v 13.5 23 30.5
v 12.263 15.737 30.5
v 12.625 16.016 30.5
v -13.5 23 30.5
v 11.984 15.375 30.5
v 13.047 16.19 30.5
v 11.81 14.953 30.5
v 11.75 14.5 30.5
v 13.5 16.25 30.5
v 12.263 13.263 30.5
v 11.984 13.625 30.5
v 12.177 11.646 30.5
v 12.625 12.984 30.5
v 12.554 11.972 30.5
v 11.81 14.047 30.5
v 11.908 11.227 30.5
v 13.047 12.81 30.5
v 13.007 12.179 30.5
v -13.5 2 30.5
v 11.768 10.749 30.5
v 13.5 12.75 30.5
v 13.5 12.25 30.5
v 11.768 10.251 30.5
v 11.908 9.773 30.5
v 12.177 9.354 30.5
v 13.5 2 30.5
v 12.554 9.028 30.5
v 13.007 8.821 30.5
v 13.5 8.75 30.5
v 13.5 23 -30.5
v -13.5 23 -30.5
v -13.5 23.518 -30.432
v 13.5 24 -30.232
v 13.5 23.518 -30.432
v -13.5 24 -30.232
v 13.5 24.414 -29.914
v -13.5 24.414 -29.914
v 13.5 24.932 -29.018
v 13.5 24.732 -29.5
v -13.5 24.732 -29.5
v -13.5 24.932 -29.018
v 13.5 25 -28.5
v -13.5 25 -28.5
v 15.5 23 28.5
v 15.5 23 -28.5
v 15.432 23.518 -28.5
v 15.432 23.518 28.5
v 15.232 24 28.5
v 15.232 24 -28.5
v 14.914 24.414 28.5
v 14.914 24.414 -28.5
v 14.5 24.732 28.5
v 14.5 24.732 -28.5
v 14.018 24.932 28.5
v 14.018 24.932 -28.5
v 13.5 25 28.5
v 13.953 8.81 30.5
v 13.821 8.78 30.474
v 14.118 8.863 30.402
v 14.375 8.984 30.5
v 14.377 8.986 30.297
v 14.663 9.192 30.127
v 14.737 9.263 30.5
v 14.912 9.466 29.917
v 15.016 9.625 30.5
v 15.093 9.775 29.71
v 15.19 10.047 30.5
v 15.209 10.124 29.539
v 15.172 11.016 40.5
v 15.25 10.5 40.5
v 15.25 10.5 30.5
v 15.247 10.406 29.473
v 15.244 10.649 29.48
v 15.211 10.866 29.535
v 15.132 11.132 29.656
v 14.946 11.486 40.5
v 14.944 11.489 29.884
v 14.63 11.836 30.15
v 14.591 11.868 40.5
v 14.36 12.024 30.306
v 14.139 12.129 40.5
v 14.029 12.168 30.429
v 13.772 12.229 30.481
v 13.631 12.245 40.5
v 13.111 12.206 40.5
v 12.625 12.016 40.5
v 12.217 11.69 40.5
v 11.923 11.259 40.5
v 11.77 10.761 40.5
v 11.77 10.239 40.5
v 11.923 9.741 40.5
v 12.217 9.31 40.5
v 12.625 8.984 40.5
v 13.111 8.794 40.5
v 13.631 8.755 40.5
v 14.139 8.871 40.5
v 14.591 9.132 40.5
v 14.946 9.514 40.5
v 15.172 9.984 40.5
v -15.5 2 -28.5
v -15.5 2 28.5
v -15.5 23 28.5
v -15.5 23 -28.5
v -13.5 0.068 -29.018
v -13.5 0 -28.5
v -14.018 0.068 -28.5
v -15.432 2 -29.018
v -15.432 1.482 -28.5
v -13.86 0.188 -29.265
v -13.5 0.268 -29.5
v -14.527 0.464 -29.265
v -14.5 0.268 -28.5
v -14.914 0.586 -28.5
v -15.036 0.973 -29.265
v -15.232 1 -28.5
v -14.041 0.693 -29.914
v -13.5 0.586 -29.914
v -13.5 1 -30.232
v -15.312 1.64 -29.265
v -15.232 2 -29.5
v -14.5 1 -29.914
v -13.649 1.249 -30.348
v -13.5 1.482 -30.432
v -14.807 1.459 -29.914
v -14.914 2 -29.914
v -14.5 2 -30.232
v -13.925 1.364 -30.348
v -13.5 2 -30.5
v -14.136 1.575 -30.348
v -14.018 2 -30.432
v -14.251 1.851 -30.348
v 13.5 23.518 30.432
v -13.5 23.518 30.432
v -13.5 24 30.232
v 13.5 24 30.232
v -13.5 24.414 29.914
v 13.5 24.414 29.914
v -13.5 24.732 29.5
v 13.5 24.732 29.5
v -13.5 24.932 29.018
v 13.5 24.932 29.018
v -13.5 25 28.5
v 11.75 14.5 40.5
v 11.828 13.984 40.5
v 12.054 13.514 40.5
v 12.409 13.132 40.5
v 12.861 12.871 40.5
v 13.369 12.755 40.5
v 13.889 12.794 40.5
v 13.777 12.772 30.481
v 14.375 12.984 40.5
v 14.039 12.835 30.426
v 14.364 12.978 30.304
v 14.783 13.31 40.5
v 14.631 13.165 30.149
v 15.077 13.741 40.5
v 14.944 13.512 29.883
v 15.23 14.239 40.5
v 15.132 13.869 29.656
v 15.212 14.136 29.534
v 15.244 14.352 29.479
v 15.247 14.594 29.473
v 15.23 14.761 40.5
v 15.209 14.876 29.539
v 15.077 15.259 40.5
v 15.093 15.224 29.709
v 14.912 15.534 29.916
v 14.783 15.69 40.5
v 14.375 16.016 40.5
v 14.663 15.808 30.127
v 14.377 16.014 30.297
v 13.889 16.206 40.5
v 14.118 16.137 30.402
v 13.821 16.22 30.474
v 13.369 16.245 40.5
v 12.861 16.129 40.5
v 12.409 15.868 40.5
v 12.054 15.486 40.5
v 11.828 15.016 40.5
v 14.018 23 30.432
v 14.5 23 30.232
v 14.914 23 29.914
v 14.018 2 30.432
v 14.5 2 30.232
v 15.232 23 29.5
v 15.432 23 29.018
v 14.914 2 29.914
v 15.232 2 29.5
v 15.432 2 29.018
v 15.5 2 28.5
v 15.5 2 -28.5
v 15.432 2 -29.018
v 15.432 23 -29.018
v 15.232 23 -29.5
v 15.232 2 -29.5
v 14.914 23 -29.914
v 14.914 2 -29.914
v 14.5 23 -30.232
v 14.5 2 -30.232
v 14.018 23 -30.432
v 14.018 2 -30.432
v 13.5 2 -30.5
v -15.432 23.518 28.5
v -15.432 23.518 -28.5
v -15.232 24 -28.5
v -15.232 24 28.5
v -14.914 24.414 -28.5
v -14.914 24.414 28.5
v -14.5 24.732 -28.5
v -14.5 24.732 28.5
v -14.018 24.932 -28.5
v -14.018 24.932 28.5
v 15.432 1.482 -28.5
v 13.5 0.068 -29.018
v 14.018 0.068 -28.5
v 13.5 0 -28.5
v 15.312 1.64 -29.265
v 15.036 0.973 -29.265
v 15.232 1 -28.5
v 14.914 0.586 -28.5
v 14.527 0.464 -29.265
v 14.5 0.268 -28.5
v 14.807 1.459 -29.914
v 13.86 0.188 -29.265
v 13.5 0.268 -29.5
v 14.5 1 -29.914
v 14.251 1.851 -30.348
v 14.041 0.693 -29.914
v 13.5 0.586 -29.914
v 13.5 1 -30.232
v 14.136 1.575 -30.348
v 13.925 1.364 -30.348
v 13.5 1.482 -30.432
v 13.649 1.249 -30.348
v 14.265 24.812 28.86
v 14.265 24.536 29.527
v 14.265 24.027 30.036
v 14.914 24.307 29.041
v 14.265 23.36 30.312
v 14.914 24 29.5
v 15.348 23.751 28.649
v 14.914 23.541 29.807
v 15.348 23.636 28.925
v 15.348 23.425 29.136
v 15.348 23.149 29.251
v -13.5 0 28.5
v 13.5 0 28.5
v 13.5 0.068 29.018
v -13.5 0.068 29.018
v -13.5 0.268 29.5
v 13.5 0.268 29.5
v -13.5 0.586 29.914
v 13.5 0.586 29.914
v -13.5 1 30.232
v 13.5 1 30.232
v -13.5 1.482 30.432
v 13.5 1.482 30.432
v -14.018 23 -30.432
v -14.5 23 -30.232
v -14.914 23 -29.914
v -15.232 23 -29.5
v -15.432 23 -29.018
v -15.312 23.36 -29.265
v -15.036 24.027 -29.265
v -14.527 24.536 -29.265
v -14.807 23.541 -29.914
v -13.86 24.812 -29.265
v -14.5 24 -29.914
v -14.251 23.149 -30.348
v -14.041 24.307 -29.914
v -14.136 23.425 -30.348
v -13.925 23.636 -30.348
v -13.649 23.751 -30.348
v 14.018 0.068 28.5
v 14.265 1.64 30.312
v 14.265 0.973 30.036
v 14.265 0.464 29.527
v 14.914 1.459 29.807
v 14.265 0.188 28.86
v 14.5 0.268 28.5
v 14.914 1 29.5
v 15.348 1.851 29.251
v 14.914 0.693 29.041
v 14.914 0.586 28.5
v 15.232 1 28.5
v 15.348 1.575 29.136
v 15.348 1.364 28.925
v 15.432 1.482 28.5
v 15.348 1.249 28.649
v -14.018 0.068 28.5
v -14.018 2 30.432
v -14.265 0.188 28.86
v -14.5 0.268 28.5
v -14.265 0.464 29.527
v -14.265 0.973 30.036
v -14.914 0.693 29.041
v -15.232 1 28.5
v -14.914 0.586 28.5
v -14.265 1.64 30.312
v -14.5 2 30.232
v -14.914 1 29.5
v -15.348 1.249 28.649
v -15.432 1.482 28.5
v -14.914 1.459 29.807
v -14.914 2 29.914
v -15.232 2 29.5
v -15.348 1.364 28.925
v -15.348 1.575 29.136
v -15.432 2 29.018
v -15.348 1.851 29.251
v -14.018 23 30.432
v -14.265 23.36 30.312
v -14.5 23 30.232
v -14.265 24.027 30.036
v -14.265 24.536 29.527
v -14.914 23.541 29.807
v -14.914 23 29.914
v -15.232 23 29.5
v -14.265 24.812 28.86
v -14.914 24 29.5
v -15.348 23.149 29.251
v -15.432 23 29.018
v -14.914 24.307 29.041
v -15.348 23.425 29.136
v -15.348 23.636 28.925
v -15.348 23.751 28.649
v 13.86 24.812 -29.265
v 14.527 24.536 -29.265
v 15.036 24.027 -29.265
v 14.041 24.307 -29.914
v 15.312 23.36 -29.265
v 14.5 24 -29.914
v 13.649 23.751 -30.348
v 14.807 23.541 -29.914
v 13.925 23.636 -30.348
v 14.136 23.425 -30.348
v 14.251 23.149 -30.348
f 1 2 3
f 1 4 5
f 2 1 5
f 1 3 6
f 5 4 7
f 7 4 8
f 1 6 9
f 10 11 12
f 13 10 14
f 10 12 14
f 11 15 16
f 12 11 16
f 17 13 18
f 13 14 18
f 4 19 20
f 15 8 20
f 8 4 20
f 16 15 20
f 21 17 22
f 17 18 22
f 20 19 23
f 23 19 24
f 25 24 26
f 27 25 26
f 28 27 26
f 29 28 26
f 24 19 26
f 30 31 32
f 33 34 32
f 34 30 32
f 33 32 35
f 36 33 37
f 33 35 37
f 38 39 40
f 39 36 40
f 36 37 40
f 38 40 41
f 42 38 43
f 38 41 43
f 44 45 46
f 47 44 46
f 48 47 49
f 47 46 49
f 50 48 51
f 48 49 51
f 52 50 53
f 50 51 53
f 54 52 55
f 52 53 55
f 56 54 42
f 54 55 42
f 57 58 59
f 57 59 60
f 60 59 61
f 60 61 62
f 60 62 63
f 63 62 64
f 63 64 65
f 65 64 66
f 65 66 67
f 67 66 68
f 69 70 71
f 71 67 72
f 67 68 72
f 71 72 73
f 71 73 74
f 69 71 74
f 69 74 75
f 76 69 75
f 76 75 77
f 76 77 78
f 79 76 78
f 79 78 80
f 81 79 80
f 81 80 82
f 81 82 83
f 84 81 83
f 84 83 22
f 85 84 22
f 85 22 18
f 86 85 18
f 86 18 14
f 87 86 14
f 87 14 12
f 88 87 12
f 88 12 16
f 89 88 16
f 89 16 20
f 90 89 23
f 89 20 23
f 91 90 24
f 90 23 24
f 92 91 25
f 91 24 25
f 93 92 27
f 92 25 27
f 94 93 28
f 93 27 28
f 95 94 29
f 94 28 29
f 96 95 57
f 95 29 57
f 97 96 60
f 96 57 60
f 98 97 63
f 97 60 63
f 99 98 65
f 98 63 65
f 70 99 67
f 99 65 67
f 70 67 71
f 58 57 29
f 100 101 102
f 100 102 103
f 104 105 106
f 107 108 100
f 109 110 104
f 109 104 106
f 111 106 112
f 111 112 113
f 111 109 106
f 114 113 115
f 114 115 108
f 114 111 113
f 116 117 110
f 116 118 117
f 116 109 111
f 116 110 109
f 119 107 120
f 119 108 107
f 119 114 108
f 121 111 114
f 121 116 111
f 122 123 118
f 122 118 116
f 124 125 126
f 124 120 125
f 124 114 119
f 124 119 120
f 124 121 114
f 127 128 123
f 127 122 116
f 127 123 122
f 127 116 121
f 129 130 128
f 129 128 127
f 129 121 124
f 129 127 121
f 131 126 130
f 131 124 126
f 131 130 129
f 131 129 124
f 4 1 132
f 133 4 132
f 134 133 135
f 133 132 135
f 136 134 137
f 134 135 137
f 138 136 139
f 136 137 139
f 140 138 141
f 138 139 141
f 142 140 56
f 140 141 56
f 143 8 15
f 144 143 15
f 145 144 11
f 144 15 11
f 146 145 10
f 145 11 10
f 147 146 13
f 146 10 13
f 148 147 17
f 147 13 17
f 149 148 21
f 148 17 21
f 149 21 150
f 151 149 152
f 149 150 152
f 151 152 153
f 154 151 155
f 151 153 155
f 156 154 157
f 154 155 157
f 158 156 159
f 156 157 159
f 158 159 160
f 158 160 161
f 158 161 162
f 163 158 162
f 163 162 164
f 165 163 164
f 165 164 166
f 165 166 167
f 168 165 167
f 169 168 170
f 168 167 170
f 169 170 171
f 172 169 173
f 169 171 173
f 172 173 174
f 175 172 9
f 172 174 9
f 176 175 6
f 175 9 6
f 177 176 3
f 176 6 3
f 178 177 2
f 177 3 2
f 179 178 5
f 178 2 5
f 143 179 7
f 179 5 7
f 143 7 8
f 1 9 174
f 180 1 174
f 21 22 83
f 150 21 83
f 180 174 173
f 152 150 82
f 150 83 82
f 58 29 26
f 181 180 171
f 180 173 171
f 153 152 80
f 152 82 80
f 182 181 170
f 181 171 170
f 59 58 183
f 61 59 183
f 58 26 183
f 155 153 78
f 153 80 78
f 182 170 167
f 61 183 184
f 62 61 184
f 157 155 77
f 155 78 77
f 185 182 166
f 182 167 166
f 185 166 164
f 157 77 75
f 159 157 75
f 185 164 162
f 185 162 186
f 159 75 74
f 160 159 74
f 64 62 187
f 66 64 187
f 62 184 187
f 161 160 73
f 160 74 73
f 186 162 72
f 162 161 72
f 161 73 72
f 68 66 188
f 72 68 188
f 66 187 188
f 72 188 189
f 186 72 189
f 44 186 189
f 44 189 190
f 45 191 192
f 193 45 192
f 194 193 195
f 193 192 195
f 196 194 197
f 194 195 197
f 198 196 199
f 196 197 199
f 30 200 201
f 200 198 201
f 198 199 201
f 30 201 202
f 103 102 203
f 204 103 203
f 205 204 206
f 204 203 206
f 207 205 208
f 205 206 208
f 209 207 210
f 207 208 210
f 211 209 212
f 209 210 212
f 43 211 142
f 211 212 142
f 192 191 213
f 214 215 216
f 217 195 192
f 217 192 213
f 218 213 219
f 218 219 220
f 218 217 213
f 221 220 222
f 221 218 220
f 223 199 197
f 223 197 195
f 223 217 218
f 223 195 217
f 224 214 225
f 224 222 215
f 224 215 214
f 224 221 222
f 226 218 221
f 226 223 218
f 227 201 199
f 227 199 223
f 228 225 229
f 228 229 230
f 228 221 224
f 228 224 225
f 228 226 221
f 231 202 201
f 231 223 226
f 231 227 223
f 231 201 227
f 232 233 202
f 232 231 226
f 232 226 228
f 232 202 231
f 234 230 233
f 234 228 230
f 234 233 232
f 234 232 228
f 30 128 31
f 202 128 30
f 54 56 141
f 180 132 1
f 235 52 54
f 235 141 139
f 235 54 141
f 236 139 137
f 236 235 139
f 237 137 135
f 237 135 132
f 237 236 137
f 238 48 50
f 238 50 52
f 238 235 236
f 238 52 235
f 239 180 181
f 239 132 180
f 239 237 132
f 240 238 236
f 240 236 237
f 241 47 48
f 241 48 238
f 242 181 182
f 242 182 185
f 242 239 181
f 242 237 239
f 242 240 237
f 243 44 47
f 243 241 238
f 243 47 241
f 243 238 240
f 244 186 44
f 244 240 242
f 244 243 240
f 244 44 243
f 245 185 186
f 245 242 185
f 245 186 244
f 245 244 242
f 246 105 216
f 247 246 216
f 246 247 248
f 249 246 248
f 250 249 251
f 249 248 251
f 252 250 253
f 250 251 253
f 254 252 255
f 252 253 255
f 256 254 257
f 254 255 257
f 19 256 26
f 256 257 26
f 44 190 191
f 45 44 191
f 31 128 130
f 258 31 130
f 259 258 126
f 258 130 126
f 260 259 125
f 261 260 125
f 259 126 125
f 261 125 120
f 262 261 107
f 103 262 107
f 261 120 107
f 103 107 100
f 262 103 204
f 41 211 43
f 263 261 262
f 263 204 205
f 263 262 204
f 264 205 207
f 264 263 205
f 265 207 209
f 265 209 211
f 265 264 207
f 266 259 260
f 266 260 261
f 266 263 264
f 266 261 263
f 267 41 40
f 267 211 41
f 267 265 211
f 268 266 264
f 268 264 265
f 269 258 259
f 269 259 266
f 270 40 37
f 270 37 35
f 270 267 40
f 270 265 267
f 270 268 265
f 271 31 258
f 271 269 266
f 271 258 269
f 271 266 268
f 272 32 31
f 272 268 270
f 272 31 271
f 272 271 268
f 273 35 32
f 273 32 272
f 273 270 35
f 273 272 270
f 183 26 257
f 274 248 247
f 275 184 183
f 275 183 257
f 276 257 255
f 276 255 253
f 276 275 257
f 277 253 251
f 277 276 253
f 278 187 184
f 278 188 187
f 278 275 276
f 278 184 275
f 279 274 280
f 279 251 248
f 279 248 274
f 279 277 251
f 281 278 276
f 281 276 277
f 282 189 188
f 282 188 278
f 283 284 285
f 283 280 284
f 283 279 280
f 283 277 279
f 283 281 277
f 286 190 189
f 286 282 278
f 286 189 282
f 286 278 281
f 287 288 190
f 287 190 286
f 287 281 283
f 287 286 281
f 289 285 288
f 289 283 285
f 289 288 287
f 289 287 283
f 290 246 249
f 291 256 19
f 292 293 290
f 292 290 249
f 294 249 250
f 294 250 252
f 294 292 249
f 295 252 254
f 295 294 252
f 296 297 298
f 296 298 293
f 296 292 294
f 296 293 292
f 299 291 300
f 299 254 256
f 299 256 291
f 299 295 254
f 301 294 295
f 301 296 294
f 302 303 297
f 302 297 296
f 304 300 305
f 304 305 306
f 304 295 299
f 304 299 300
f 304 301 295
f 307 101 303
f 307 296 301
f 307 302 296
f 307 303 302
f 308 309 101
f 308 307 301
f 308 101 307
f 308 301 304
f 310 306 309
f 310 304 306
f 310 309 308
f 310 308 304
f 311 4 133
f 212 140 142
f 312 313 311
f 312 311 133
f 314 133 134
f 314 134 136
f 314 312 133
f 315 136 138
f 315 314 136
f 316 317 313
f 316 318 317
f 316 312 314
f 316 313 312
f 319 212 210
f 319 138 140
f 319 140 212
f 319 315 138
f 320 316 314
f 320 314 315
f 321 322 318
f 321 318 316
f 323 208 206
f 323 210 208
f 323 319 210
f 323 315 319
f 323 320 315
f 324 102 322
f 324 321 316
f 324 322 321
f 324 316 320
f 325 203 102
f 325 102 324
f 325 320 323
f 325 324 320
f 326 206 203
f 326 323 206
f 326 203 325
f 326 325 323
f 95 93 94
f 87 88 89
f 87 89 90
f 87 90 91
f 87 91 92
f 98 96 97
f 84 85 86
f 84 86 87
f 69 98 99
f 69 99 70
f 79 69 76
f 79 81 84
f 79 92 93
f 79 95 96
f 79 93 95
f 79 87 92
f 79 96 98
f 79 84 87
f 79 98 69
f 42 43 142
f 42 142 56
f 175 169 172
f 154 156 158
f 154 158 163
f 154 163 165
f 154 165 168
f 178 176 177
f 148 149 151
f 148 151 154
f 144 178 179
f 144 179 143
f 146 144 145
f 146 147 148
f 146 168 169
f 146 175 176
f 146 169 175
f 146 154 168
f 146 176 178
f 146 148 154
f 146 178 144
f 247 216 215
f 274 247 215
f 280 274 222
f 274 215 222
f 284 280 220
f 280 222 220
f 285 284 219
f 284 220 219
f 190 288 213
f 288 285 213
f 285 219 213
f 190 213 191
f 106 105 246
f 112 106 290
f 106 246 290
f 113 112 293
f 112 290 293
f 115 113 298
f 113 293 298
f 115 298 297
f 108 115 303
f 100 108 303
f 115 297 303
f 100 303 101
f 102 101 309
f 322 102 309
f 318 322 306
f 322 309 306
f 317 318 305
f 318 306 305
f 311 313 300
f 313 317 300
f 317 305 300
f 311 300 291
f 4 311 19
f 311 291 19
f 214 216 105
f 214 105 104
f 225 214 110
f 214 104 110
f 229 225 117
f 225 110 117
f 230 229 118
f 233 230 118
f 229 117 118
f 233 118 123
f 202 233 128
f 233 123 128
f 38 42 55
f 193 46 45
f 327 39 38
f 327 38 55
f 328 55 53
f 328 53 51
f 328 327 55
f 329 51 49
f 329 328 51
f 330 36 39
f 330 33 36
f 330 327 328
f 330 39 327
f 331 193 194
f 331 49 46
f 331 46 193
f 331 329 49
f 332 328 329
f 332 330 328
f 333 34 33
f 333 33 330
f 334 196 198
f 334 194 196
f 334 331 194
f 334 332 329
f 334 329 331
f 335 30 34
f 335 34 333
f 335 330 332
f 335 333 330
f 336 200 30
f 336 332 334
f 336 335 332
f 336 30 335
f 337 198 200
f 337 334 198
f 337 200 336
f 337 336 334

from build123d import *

# Parameters (mm, degrees)
SKETCH1_W           = 31
SKETCH1_H           = 61
BOSS_EXTRUDE1_DEPTH = 25
SKETCH2_R           = 1.75
BOSS_EXTRUDE2_DEPTH = 10
FILLET1_R           = 2


with BuildPart() as part:
    # Sketch1 → Boss-Extrude1 (new body)
    with BuildSketch(Plane(origin=(0, 0, 0), x_dir=(1, 0, 0), z_dir=(0, 1, 0))):
        Rectangle(SKETCH1_W, SKETCH1_H)
    extrude(amount=BOSS_EXTRUDE1_DEPTH)

    # Sketch2 → Boss-Extrude2 (add)
    with BuildSketch(Plane.XY.offset(30.5)):
        with Locations(Location((13.5, 14.5, 0), (0, 0, 180))):
            Circle(SKETCH2_R)
        with Locations((13.5, 10.5)):
            Circle(SKETCH2_R)
    extrude(amount=BOSS_EXTRUDE2_DEPTH)

    # Fillet1
    # the kernel refuses this fillet: 2 mm, written as the material it takes off along each edge
    with BuildSketch(Plane(origin=(-13.5, 23, 28.5), x_dir=(0, 1, 0), z_dir=(-1, 0, 0))) as fillet1_piece_1_section:
        Polygon((0, 0), (FILLET1_R, 0), (FILLET1_R, -FILLET1_R), (0, -FILLET1_R), align=None)
    fillet1_piece_1 = extrude(amount=FILLET1_R, mode=Mode.PRIVATE)
    fillet1_piece_1 = fillet1_piece_1 - Plane(origin=(-13.5, 23, 28.5), x_dir=(0, -0.7071067811865475, -0.7071067811865475), z_dir=(-1, 0, 0)) * Sphere(FILLET1_R, mode=Mode.PRIVATE)
    add(fillet1_piece_1, mode=Mode.SUBTRACT)
    with BuildSketch(Plane(origin=(-13.5, 23, -28.5), x_dir=(-1, 0, 0), z_dir=(0, 0, -1))) as fillet1_piece_2_section:
        Polygon((0, 0), (FILLET1_R, 0), (FILLET1_R, FILLET1_R), (0, FILLET1_R), align=None)
    fillet1_piece_2 = extrude(amount=FILLET1_R, mode=Mode.PRIVATE)
    fillet1_piece_2 = fillet1_piece_2 - Plane(origin=(-13.5, 23, -28.5), x_dir=(0.7071067811865475, -0.7071067811865475, 0), z_dir=(0, 0, -1)) * Sphere(FILLET1_R, mode=Mode.PRIVATE)
    add(fillet1_piece_2, mode=Mode.SUBTRACT)
    with BuildSketch(Plane(origin=(13.5, 23, 28.5), x_dir=(0, 1, 0), z_dir=(1, 0, 0))) as fillet1_piece_3_section:
        Polygon((0, 0), (FILLET1_R, 0), (FILLET1_R, FILLET1_R), (0, FILLET1_R), align=None)
    fillet1_piece_3 = extrude(amount=FILLET1_R, mode=Mode.PRIVATE)
    fillet1_piece_3 = fillet1_piece_3 - Plane(origin=(13.5, 23, 28.5), x_dir=(0, -0.7071067811865475, -0.7071067811865475), z_dir=(1, 0, 0)) * Sphere(FILLET1_R, mode=Mode.PRIVATE)
    add(fillet1_piece_3, mode=Mode.SUBTRACT)
    with BuildSketch(Plane(origin=(13.5, 23, -28.5), x_dir=(1, 0, 0), z_dir=(0, 0, -1))) as fillet1_piece_4_section:
        Polygon((0, 0), (FILLET1_R, 0), (FILLET1_R, -FILLET1_R), (0, -FILLET1_R), align=None)
    fillet1_piece_4 = extrude(amount=FILLET1_R, mode=Mode.PRIVATE)
    fillet1_piece_4 = fillet1_piece_4 - Plane(origin=(13.5, 23, -28.5), x_dir=(-0.7071067811865475, -0.7071067811865475, 0), z_dir=(0, 0, -1)) * Sphere(FILLET1_R, mode=Mode.PRIVATE)
    add(fillet1_piece_4, mode=Mode.SUBTRACT)
    with BuildSketch(Plane(origin=(13.5, 2, 28.5), x_dir=(0, -1, 0), z_dir=(1, 0, 0))) as fillet1_piece_5_section:
        Polygon((0, 0), (FILLET1_R, 0), (FILLET1_R, -FILLET1_R), (0, -FILLET1_R), align=None)
    fillet1_piece_5 = extrude(amount=FILLET1_R, mode=Mode.PRIVATE)
    fillet1_piece_5 = fillet1_piece_5 - Plane(origin=(13.5, 2, 28.5), x_dir=(0, 0.7071067811865475, -0.7071067811865475), z_dir=(1, 0, 0)) * Sphere(FILLET1_R, mode=Mode.PRIVATE)
    add(fillet1_piece_5, mode=Mode.SUBTRACT)
    with BuildSketch(Plane(origin=(-13.5, 2, 28.5), x_dir=(0, -1, 0), z_dir=(-1, 0, 0))) as fillet1_piece_6_section:
        Polygon((0, 0), (FILLET1_R, 0), (FILLET1_R, FILLET1_R), (0, FILLET1_R), align=None)
    fillet1_piece_6 = extrude(amount=FILLET1_R, mode=Mode.PRIVATE)
    fillet1_piece_6 = fillet1_piece_6 - Plane(origin=(-13.5, 2, 28.5), x_dir=(0, 0.7071067811865475, -0.7071067811865475), z_dir=(-1, 0, 0)) * Sphere(FILLET1_R, mode=Mode.PRIVATE)
    add(fillet1_piece_6, mode=Mode.SUBTRACT)
    with BuildSketch(Plane(origin=(-13.5, 2, -28.5), x_dir=(-1, 0, 0), z_dir=(0, 0, -1))) as fillet1_piece_7_section:
        Polygon((0, 0), (FILLET1_R, 0), (FILLET1_R, -FILLET1_R), (0, -FILLET1_R), align=None)
    fillet1_piece_7 = extrude(amount=FILLET1_R, mode=Mode.PRIVATE)
    fillet1_piece_7 = fillet1_piece_7 - Plane(origin=(-13.5, 2, -28.5), x_dir=(0.7071067811865475, 0.7071067811865475, 0), z_dir=(0, 0, -1)) * Sphere(FILLET1_R, mode=Mode.PRIVATE)
    add(fillet1_piece_7, mode=Mode.SUBTRACT)
    with BuildSketch(Plane(origin=(13.5, 2, -28.5), x_dir=(1, 0, 0), z_dir=(0, 0, -1))) as fillet1_piece_8_section:
        Polygon((0, 0), (FILLET1_R, 0), (FILLET1_R, FILLET1_R), (0, FILLET1_R), align=None)
    fillet1_piece_8 = extrude(amount=FILLET1_R, mode=Mode.PRIVATE)
    fillet1_piece_8 = fillet1_piece_8 - Plane(origin=(13.5, 2, -28.5), x_dir=(-0.7071067811865475, 0.7071067811865475, 0), z_dir=(0, 0, -1)) * Sphere(FILLET1_R, mode=Mode.PRIVATE)
    add(fillet1_piece_8, mode=Mode.SUBTRACT)
    with BuildSketch(Plane(origin=(-15.5, 25, 28.5), x_dir=(0, -1, 0), z_dir=(0, 0, -1)), Plane(origin=(15.5, 25, -28.5), x_dir=(0, -1, 0), z_dir=(0, 0, 1))) as fillet1_piece_9:
        with BuildLine():
            CenterArc((FILLET1_R, -FILLET1_R), FILLET1_R, 90, 90)
            Line((0, -FILLET1_R), (0, 0))
            Line((0, 0), (FILLET1_R, 0))
        make_face()
    extrude(amount=57, mode=Mode.SUBTRACT)
    with BuildSketch(Plane(origin=(13.5, 25, 30.5), x_dir=(0, 0, -1), z_dir=(-1, 0, 0)), Plane(origin=(-13.5, 0, -30.5), x_dir=(0, 1, 0), z_dir=(1, 0, 0))) as fillet1_piece_10:
        with BuildLine():
            CenterArc((FILLET1_R, FILLET1_R), FILLET1_R, 180, 90)
            Line((0, FILLET1_R), (0, 0))
            Line((0, 0), (FILLET1_R, 0))
        make_face()
    extrude(amount=27, mode=Mode.SUBTRACT)
    with BuildSketch(Plane(origin=(13.5, 0, 30.5), x_dir=(0, 0, -1), z_dir=(-1, 0, 0)), Plane(origin=(-13.5, 25, -30.5), x_dir=(0, -1, 0), z_dir=(1, 0, 0))) as fillet1_piece_11:
        with BuildLine():
            CenterArc((FILLET1_R, -FILLET1_R), FILLET1_R, 90, 90)
            Line((0, -FILLET1_R), (0, 0))
            Line((0, 0), (FILLET1_R, 0))
        make_face()
    extrude(amount=27, mode=Mode.SUBTRACT)
    with BuildSketch(Plane(origin=(-15.5, 0, 28.5), x_dir=(0, 1, 0), z_dir=(0, 0, -1)), Plane(origin=(15.5, 0, -28.5), x_dir=(0, 1, 0), z_dir=(0, 0, 1))) as fillet1_piece_12:
        with BuildLine():
            CenterArc((FILLET1_R, FILLET1_R), FILLET1_R, 180, 90)
            Line((0, FILLET1_R), (0, 0))
            Line((0, 0), (FILLET1_R, 0))
        make_face()
    extrude(amount=57, mode=Mode.SUBTRACT)
    with BuildSketch(Plane(origin=(15.5, 2, 30.5), x_dir=(0, 0, -1), z_dir=(0, 1, 0))) as fillet1_piece_13_section:
        with BuildLine():
            CenterArc((FILLET1_R, FILLET1_R), FILLET1_R, 180, 90)
            Line((0, FILLET1_R), (0, 0))
            Line((0, 0), (FILLET1_R, 0))
        make_face()
    fillet1_piece_13 = extrude(amount=21, mode=Mode.PRIVATE)
    fillet1_piece_13 = fillet1_piece_13 - Plane(origin=(13.5, 14.5, 30.013488992), x_dir=(-1, 0, 0), z_dir=(0, 0, -1)) * Cylinder(1.75, 50, mode=Mode.PRIVATE)
    fillet1_piece_13 = fillet1_piece_13 - Plane(origin=(13.5, 10.5, 30.013488992), x_dir=(1, 0, 0), z_dir=(0, 0, -1)) * Cylinder(1.75, 50, mode=Mode.PRIVATE)
    add(fillet1_piece_13, mode=Mode.SUBTRACT)
    with BuildSketch(Plane(origin=(-15.5, 2, 30.5), x_dir=(0, 0, -1), z_dir=(0, 1, 0)), Plane(origin=(-15.5, 2, -30.5), x_dir=(1, 0, 0), z_dir=(0, 1, 0))) as fillet1_piece_14:
        with BuildLine():
            CenterArc((FILLET1_R, -FILLET1_R), FILLET1_R, 90, 90)
            Line((0, -FILLET1_R), (0, 0))
            Line((0, 0), (FILLET1_R, 0))
        make_face()
    extrude(amount=21, mode=Mode.SUBTRACT)
    with BuildSketch(Plane(origin=(15.5, 2, -30.5), x_dir=(-1, 0, 0), z_dir=(0, 1, 0))) as fillet1_piece_15:
        with BuildLine():
            CenterArc((FILLET1_R, FILLET1_R), FILLET1_R, 180, 90)
            Line((0, FILLET1_R), (0, 0))
            Line((0, 0), (FILLET1_R, 0))
        make_face()
    extrude(amount=21, mode=Mode.SUBTRACT)


solid = part.part
